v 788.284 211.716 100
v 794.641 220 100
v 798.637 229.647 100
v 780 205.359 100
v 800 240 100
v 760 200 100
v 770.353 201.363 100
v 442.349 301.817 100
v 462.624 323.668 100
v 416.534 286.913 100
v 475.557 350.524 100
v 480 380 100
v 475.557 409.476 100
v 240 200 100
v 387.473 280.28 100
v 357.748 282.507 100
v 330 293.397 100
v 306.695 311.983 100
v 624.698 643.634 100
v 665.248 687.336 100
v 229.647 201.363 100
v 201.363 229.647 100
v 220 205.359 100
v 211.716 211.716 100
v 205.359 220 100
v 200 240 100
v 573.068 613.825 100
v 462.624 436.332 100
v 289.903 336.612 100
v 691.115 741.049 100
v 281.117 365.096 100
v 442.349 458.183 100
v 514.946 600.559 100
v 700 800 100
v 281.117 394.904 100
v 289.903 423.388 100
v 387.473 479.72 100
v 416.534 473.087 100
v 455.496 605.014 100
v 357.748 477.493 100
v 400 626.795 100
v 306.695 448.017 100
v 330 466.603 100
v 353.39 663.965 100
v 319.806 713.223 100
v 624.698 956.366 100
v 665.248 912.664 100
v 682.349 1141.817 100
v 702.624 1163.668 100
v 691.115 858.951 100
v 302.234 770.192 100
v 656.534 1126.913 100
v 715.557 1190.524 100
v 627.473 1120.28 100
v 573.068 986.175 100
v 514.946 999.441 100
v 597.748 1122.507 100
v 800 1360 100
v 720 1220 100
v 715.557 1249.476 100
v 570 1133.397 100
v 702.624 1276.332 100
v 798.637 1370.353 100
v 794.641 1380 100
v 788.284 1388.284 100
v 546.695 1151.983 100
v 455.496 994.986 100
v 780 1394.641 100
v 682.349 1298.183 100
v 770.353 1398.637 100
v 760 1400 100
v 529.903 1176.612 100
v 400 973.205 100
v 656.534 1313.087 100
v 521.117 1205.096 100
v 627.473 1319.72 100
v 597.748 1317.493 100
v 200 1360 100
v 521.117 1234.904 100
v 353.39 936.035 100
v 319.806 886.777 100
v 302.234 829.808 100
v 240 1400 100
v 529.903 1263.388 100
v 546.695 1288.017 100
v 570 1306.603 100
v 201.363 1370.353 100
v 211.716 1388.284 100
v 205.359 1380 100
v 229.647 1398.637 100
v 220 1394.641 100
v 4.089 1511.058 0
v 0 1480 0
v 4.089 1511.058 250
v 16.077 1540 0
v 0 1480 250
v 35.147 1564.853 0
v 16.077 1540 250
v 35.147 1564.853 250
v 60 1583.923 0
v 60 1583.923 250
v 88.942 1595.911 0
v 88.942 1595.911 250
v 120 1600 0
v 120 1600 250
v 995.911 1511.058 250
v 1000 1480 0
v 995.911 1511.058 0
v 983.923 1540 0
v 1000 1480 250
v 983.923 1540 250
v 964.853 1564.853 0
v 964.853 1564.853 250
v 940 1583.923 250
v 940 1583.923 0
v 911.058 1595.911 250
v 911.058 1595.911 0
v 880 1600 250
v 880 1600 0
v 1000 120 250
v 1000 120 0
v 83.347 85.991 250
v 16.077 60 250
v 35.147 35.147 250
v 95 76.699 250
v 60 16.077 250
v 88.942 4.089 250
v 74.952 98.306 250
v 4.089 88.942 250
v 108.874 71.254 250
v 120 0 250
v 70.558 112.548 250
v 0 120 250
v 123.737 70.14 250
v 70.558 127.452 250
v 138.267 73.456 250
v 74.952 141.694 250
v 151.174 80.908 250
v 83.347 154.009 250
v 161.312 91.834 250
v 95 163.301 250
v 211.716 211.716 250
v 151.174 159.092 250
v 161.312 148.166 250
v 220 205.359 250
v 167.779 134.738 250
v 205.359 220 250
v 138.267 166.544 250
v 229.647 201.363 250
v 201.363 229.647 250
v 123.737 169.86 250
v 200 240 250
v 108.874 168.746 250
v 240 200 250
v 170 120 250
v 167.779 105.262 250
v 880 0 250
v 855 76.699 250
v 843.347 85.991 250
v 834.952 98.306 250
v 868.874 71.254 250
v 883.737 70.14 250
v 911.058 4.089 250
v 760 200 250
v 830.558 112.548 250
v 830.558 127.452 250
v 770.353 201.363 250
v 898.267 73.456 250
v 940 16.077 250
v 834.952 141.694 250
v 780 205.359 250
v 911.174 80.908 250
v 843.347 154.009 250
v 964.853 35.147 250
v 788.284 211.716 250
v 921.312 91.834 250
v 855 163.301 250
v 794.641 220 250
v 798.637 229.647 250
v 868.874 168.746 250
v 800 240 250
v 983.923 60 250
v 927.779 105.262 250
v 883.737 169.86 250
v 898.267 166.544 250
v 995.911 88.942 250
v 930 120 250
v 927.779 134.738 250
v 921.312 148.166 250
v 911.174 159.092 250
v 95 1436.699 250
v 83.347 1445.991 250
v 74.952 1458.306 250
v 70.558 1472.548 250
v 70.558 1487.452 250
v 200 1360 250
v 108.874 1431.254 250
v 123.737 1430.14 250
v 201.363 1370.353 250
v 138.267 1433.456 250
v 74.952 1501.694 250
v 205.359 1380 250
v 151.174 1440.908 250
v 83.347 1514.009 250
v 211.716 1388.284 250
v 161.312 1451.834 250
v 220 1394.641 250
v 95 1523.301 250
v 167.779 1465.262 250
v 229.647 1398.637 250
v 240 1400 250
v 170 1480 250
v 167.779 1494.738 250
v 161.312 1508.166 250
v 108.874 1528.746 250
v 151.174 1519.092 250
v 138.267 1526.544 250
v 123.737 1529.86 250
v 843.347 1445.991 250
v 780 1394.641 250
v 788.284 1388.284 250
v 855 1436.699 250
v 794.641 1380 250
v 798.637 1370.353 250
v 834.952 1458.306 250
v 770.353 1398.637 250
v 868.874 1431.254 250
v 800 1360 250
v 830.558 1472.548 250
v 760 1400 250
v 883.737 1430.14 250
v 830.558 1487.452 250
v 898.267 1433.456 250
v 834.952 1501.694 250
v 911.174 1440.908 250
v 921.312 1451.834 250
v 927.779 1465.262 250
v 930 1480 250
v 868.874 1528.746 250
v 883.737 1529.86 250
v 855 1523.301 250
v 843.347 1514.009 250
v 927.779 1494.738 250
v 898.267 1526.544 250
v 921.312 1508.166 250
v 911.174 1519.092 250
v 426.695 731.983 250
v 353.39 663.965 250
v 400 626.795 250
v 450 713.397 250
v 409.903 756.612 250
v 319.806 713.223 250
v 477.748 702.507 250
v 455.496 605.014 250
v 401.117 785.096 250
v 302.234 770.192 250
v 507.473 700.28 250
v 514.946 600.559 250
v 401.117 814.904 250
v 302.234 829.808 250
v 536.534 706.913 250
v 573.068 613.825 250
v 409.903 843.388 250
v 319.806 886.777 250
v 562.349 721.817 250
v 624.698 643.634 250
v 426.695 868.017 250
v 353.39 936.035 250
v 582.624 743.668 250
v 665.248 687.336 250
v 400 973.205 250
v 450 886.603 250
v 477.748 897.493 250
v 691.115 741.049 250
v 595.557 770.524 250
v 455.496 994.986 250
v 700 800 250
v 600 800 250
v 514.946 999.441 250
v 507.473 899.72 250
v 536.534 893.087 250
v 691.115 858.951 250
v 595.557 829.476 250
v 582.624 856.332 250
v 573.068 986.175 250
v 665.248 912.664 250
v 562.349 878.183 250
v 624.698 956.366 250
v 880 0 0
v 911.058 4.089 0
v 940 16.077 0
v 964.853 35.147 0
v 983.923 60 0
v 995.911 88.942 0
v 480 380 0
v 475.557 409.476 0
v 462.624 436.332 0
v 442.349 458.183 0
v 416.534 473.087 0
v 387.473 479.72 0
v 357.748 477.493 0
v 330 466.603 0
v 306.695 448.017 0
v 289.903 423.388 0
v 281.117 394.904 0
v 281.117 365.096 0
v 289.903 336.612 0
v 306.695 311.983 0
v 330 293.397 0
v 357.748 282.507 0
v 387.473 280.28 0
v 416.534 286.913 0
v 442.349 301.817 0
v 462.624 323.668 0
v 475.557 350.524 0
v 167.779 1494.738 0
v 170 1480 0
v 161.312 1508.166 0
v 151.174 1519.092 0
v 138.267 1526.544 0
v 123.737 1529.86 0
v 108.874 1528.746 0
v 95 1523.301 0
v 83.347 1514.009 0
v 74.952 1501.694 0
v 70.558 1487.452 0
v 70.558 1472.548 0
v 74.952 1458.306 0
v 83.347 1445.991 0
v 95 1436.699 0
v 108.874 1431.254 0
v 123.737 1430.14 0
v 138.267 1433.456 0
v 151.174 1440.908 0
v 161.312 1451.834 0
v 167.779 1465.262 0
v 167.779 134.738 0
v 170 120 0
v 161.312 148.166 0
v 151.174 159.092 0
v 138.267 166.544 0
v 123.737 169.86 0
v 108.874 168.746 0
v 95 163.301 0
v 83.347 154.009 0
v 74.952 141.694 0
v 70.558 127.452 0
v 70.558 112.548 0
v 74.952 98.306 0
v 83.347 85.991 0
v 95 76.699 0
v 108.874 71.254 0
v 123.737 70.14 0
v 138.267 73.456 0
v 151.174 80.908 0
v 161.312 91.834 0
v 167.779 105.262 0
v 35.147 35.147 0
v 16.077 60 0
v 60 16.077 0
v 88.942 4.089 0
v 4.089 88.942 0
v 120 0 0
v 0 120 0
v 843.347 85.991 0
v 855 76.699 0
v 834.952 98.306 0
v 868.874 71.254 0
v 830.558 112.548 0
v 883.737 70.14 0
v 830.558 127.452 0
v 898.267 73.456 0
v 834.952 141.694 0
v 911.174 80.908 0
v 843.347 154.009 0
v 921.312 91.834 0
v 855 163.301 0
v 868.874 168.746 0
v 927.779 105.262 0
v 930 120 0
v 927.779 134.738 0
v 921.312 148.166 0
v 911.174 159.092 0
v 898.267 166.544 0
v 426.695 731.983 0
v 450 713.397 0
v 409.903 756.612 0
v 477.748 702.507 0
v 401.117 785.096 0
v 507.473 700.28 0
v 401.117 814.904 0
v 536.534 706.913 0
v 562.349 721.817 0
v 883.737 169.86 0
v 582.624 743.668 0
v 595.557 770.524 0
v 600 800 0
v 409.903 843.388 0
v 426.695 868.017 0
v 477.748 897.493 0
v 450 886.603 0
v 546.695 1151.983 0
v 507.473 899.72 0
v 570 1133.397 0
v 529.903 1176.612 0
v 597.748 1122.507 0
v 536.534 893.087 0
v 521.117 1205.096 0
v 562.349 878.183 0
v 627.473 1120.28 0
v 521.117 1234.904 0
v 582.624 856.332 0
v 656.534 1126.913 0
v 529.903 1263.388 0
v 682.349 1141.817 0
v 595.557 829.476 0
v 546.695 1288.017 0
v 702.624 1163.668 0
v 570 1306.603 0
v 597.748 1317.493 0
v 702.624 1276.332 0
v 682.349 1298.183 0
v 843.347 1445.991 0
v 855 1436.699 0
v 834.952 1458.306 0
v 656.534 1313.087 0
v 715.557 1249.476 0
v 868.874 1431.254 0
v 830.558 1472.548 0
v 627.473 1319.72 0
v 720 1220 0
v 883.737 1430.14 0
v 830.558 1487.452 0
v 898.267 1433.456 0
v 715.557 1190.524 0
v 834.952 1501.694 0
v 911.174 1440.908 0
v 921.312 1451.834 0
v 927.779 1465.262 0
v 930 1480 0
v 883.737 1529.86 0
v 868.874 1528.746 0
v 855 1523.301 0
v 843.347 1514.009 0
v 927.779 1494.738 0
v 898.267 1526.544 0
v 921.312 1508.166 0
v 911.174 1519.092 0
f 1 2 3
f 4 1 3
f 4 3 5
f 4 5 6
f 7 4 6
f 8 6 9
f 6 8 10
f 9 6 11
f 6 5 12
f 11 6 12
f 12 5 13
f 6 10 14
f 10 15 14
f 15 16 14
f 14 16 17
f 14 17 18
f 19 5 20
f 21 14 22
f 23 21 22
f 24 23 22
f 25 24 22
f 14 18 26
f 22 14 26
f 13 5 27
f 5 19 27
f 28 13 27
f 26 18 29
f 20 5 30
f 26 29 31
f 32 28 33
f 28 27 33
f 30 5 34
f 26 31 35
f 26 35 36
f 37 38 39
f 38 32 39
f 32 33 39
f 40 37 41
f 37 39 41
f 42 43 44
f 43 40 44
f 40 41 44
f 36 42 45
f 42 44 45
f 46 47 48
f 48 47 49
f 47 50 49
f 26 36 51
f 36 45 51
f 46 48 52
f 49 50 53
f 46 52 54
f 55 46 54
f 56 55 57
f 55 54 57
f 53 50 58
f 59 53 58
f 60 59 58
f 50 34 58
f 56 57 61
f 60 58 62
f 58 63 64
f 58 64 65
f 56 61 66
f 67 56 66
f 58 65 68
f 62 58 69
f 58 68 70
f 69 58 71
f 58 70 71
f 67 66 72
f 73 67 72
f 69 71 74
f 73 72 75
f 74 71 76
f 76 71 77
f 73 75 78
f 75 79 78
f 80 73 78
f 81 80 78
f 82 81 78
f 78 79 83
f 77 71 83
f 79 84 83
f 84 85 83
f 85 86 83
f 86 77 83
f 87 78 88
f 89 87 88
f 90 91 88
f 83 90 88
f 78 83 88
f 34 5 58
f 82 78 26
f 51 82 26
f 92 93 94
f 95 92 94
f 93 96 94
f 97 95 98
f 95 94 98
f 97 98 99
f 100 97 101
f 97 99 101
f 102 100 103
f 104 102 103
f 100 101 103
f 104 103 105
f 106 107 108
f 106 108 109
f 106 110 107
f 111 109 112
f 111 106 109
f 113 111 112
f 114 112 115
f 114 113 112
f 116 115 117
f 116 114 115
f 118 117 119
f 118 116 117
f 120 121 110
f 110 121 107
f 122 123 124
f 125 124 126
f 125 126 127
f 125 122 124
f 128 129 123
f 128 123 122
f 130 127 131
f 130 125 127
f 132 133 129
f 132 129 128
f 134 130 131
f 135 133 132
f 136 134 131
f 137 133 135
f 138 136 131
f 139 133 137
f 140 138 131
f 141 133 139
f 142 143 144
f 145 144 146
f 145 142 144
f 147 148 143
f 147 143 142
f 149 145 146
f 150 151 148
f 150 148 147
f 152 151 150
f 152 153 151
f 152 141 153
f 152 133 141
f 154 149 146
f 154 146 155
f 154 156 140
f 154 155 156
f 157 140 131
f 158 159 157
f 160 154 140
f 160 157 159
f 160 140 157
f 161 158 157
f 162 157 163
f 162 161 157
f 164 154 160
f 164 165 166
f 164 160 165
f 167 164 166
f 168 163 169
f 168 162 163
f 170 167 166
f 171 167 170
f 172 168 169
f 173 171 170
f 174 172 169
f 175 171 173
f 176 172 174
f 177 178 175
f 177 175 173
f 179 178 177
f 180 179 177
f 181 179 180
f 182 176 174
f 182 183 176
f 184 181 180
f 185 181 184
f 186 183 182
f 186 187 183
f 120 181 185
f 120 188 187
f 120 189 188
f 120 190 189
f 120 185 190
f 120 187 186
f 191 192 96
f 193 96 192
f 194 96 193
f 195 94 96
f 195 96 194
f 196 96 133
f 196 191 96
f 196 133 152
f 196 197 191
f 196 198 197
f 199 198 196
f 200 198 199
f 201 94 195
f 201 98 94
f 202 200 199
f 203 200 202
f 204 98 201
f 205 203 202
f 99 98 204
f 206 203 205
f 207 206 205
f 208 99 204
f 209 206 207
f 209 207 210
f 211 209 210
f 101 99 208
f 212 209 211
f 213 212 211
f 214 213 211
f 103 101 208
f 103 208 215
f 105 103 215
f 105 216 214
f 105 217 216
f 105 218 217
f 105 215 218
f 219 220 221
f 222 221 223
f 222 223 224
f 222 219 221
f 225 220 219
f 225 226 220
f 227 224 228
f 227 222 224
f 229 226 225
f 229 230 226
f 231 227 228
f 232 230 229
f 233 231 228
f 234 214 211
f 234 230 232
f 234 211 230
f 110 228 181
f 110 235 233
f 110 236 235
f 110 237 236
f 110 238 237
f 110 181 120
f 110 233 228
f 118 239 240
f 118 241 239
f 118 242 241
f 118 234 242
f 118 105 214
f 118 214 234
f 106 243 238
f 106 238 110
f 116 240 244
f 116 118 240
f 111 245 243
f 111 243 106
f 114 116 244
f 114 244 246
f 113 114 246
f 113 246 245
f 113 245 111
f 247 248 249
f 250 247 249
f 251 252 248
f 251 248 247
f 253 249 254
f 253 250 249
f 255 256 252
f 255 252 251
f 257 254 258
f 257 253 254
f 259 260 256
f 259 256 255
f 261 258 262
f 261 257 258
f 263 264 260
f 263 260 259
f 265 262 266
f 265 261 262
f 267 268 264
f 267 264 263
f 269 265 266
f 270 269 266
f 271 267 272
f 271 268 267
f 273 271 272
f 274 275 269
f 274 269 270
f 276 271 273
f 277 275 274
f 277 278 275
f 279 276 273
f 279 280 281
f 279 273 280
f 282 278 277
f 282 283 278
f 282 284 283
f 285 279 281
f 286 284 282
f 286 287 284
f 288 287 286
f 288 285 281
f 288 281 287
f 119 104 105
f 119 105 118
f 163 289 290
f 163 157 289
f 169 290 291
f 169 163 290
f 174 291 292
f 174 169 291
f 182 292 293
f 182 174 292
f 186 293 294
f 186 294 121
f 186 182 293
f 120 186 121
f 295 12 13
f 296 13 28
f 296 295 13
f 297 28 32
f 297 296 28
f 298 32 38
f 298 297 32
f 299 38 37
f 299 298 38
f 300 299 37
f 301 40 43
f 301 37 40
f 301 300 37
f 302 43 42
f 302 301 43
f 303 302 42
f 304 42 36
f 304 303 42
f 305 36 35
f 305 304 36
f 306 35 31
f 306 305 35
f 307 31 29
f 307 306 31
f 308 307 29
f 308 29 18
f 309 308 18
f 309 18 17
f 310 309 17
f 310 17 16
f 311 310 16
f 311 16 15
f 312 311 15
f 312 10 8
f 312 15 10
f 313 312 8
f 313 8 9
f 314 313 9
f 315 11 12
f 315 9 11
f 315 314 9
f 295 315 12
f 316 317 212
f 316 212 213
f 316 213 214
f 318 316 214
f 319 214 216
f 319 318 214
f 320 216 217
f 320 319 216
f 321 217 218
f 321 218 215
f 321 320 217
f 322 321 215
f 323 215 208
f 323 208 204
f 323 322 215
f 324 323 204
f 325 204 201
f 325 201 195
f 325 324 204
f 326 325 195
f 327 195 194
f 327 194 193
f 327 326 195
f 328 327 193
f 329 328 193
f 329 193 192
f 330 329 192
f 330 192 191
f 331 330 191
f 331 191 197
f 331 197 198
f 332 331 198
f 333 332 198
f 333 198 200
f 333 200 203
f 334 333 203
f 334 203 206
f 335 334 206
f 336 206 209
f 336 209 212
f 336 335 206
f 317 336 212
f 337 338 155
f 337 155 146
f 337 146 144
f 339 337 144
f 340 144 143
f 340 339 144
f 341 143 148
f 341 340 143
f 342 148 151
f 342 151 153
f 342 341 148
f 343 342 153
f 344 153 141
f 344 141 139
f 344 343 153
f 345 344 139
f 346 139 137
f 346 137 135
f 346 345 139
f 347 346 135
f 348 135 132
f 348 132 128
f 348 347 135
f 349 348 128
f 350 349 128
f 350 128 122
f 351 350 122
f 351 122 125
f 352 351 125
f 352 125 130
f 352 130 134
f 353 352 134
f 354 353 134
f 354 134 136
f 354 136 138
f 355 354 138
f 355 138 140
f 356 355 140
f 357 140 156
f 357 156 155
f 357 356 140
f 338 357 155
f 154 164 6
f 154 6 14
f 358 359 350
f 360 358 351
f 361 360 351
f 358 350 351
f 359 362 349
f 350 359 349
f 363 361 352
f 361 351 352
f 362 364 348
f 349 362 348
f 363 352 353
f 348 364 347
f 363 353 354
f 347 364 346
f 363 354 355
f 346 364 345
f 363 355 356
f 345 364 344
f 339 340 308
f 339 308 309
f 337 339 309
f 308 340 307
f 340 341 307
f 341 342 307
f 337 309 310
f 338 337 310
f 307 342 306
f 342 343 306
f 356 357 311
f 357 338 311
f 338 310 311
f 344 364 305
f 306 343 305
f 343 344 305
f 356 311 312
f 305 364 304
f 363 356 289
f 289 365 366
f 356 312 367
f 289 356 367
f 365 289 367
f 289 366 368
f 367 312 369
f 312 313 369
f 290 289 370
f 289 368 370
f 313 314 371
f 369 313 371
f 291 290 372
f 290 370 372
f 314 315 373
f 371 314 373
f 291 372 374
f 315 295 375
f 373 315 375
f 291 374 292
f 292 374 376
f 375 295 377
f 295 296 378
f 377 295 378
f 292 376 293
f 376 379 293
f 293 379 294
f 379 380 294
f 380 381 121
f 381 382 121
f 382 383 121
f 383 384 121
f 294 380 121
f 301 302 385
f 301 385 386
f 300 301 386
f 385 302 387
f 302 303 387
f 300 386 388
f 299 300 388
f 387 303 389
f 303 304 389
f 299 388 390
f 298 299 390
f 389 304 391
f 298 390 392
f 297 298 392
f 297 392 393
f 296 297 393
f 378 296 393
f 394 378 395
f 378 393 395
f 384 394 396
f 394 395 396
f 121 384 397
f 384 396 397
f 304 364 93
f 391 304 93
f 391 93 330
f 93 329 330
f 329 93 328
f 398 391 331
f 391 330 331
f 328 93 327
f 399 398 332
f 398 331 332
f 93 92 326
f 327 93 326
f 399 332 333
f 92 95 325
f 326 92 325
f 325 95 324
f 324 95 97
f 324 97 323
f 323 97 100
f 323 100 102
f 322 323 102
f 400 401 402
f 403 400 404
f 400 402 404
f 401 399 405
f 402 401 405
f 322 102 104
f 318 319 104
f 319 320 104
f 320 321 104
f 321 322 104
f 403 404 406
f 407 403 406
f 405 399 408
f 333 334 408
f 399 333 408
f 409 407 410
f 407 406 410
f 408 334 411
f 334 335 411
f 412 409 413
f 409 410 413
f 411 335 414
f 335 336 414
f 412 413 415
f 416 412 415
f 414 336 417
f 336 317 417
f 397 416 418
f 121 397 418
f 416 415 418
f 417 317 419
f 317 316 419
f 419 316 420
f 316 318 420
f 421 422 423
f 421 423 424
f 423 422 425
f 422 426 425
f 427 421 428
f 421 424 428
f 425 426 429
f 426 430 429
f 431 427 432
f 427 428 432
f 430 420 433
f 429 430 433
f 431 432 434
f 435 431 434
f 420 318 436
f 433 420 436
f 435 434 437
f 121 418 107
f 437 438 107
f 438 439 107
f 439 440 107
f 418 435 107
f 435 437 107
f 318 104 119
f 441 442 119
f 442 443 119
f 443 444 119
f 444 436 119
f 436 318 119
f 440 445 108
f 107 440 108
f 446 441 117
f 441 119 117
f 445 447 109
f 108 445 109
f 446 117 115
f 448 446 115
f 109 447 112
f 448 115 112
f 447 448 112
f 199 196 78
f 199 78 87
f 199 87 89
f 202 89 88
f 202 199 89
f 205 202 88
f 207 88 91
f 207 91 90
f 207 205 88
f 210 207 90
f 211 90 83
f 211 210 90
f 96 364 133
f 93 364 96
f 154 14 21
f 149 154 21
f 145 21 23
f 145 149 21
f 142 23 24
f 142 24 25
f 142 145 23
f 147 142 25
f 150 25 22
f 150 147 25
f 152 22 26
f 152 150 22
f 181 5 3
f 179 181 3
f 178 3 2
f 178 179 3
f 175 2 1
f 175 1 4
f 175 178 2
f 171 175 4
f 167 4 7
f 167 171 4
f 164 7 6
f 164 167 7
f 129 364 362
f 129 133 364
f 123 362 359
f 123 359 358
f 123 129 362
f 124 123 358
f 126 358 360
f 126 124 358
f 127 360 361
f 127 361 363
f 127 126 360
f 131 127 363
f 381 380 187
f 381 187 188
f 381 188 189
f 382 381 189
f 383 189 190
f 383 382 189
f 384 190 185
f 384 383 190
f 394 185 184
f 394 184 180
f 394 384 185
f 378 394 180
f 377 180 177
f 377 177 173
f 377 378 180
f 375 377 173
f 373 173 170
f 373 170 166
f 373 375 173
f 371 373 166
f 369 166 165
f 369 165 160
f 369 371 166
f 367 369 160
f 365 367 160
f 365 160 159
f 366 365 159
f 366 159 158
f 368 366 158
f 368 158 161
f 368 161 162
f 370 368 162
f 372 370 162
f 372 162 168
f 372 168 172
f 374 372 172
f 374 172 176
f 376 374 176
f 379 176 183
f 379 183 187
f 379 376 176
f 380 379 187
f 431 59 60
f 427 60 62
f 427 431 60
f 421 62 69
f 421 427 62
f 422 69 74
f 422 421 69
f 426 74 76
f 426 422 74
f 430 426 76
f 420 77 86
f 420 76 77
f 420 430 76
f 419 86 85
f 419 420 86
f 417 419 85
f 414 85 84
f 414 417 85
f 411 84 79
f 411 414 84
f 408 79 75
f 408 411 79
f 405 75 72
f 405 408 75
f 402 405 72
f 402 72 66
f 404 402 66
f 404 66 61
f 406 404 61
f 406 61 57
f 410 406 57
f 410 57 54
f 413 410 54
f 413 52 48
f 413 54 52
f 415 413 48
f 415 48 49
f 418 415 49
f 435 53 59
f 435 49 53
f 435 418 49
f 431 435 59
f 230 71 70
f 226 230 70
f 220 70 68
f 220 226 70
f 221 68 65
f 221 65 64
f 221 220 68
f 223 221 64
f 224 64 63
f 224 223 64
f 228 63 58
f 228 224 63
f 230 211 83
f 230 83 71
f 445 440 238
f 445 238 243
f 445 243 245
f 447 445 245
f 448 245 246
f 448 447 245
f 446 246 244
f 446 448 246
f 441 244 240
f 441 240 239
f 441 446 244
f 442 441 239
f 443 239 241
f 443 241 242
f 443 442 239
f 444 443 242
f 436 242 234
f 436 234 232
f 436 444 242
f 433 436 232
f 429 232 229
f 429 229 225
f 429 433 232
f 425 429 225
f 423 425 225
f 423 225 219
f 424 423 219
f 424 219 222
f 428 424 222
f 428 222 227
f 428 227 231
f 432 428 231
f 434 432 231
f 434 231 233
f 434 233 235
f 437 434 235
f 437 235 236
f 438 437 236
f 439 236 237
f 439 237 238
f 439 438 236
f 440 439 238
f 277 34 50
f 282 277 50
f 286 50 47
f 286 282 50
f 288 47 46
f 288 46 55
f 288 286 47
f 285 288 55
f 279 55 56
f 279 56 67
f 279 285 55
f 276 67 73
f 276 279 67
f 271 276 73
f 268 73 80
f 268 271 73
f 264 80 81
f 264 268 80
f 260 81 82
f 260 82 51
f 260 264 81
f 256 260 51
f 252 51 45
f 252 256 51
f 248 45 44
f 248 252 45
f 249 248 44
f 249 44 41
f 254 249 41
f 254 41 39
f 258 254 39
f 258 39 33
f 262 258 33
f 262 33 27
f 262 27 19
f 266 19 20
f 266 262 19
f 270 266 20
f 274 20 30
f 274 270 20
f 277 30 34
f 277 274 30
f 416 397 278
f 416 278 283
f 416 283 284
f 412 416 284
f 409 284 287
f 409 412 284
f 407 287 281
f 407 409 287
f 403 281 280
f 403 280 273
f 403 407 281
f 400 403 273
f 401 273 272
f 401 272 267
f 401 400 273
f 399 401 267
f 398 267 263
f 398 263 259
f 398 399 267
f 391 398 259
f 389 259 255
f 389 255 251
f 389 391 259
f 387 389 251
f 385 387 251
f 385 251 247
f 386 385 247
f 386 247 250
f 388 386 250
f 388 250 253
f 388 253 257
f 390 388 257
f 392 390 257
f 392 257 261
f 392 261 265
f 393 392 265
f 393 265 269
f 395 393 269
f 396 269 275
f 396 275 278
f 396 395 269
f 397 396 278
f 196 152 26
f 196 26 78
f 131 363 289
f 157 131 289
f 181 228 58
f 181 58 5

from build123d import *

# Parameters (mm, degrees)
ESQUISSE1_W             = 1000
ESQUISSE1_H             = 1600
ESQUISSE1_R             = 50
ESQUISSE1_W_2           = 600
ESQUISSE1_H_2           = 1200
ESQUISSE1_R_2           = 100
ESQUISSE1_R_3           = 200
BOSS_EXTRU_1_DEPTH      = 250
ESQUISSE3_R             = 200
ENL_V_MAT_EXTRU_1_DEPTH = 150
CONG_1_R                = 120


with BuildPart() as part:
    # Esquisse1 → Boss.-Extru.1 (new body)
    # profile 1 of 3: a face of its own
    with BuildSketch(Plane.XY):
        with Locations((500, 800)):
            Rectangle(ESQUISSE1_W, ESQUISSE1_H)
        with Locations((880, 1480)):
            Circle(ESQUISSE1_R, mode=Mode.SUBTRACT)
        with Locations((120, 1480)):
            Circle(ESQUISSE1_R, mode=Mode.SUBTRACT)
        with Locations((880, 120)):
            Circle(ESQUISSE1_R, mode=Mode.SUBTRACT)
        with Locations((120, 120)):
            Circle(ESQUISSE1_R, mode=Mode.SUBTRACT)
        with Locations((500, 800)):
            Rectangle(ESQUISSE1_W_2, ESQUISSE1_H_2, mode=Mode.SUBTRACT)
    # profile 2 of 3: a face of its own
    with BuildSketch(Plane.XY):
        with Locations((500, 800)):
            Rectangle(ESQUISSE1_W_2, ESQUISSE1_H_2)
        with Locations((620, 1220)):
            Circle(ESQUISSE1_R_2, mode=Mode.SUBTRACT)
        with Locations((380, 380)):
            Circle(ESQUISSE1_R_2, mode=Mode.SUBTRACT)
        with Locations((500, 800)):
            Circle(ESQUISSE1_R_3, mode=Mode.SUBTRACT)
    # profile 3 of 3: a face of its own
    with BuildSketch(Plane.XY):
        with Locations((500, 800)):
            Circle(ESQUISSE1_R_3)
        with Locations((500, 800)):
            Circle(ESQUISSE1_R_2, mode=Mode.SUBTRACT)
    extrude(amount=BOSS_EXTRU_1_DEPTH)

    # Esquisse3 → Enlèv. mat.-Extru.1 (cut)
    with BuildSketch(Plane.XY.offset(250)):
        with BuildLine():
            Line((240, 1400), (760, 1400))
            ThreePointArc((760, 1400), (788.284271247, 1388.284271247), (800, 1360))
            Line((800, 1360), (800, 240))
            ThreePointArc((800, 240), (788.284271247, 211.715728753), (760, 200))
            Line((760, 200), (240, 200))
            ThreePointArc((240, 200), (211.715728753, 211.715728753), (200, 240))
            Line((200, 240), (200, 1360))
            ThreePointArc((200, 1360), (211.715728753, 1388.284271247), (240, 1400))
        make_face()
        with Locations((500, 800)):
            Circle(ESQUISSE3_R, mode=Mode.SUBTRACT)
    extrude(amount=-ENL_V_MAT_EXTRU_1_DEPTH, mode=Mode.SUBTRACT)

    # Congé1
    cong_1_edges = [part.edges().sort_by_distance(p)[0] for p in [
        (0, 0, 125),
        (0, 1600, 125),
        (1000, 1600, 125),
        (1000, 0, 125),
    ]]
    fillet(cong_1_edges, radius=CONG_1_R)


solid = part.part
